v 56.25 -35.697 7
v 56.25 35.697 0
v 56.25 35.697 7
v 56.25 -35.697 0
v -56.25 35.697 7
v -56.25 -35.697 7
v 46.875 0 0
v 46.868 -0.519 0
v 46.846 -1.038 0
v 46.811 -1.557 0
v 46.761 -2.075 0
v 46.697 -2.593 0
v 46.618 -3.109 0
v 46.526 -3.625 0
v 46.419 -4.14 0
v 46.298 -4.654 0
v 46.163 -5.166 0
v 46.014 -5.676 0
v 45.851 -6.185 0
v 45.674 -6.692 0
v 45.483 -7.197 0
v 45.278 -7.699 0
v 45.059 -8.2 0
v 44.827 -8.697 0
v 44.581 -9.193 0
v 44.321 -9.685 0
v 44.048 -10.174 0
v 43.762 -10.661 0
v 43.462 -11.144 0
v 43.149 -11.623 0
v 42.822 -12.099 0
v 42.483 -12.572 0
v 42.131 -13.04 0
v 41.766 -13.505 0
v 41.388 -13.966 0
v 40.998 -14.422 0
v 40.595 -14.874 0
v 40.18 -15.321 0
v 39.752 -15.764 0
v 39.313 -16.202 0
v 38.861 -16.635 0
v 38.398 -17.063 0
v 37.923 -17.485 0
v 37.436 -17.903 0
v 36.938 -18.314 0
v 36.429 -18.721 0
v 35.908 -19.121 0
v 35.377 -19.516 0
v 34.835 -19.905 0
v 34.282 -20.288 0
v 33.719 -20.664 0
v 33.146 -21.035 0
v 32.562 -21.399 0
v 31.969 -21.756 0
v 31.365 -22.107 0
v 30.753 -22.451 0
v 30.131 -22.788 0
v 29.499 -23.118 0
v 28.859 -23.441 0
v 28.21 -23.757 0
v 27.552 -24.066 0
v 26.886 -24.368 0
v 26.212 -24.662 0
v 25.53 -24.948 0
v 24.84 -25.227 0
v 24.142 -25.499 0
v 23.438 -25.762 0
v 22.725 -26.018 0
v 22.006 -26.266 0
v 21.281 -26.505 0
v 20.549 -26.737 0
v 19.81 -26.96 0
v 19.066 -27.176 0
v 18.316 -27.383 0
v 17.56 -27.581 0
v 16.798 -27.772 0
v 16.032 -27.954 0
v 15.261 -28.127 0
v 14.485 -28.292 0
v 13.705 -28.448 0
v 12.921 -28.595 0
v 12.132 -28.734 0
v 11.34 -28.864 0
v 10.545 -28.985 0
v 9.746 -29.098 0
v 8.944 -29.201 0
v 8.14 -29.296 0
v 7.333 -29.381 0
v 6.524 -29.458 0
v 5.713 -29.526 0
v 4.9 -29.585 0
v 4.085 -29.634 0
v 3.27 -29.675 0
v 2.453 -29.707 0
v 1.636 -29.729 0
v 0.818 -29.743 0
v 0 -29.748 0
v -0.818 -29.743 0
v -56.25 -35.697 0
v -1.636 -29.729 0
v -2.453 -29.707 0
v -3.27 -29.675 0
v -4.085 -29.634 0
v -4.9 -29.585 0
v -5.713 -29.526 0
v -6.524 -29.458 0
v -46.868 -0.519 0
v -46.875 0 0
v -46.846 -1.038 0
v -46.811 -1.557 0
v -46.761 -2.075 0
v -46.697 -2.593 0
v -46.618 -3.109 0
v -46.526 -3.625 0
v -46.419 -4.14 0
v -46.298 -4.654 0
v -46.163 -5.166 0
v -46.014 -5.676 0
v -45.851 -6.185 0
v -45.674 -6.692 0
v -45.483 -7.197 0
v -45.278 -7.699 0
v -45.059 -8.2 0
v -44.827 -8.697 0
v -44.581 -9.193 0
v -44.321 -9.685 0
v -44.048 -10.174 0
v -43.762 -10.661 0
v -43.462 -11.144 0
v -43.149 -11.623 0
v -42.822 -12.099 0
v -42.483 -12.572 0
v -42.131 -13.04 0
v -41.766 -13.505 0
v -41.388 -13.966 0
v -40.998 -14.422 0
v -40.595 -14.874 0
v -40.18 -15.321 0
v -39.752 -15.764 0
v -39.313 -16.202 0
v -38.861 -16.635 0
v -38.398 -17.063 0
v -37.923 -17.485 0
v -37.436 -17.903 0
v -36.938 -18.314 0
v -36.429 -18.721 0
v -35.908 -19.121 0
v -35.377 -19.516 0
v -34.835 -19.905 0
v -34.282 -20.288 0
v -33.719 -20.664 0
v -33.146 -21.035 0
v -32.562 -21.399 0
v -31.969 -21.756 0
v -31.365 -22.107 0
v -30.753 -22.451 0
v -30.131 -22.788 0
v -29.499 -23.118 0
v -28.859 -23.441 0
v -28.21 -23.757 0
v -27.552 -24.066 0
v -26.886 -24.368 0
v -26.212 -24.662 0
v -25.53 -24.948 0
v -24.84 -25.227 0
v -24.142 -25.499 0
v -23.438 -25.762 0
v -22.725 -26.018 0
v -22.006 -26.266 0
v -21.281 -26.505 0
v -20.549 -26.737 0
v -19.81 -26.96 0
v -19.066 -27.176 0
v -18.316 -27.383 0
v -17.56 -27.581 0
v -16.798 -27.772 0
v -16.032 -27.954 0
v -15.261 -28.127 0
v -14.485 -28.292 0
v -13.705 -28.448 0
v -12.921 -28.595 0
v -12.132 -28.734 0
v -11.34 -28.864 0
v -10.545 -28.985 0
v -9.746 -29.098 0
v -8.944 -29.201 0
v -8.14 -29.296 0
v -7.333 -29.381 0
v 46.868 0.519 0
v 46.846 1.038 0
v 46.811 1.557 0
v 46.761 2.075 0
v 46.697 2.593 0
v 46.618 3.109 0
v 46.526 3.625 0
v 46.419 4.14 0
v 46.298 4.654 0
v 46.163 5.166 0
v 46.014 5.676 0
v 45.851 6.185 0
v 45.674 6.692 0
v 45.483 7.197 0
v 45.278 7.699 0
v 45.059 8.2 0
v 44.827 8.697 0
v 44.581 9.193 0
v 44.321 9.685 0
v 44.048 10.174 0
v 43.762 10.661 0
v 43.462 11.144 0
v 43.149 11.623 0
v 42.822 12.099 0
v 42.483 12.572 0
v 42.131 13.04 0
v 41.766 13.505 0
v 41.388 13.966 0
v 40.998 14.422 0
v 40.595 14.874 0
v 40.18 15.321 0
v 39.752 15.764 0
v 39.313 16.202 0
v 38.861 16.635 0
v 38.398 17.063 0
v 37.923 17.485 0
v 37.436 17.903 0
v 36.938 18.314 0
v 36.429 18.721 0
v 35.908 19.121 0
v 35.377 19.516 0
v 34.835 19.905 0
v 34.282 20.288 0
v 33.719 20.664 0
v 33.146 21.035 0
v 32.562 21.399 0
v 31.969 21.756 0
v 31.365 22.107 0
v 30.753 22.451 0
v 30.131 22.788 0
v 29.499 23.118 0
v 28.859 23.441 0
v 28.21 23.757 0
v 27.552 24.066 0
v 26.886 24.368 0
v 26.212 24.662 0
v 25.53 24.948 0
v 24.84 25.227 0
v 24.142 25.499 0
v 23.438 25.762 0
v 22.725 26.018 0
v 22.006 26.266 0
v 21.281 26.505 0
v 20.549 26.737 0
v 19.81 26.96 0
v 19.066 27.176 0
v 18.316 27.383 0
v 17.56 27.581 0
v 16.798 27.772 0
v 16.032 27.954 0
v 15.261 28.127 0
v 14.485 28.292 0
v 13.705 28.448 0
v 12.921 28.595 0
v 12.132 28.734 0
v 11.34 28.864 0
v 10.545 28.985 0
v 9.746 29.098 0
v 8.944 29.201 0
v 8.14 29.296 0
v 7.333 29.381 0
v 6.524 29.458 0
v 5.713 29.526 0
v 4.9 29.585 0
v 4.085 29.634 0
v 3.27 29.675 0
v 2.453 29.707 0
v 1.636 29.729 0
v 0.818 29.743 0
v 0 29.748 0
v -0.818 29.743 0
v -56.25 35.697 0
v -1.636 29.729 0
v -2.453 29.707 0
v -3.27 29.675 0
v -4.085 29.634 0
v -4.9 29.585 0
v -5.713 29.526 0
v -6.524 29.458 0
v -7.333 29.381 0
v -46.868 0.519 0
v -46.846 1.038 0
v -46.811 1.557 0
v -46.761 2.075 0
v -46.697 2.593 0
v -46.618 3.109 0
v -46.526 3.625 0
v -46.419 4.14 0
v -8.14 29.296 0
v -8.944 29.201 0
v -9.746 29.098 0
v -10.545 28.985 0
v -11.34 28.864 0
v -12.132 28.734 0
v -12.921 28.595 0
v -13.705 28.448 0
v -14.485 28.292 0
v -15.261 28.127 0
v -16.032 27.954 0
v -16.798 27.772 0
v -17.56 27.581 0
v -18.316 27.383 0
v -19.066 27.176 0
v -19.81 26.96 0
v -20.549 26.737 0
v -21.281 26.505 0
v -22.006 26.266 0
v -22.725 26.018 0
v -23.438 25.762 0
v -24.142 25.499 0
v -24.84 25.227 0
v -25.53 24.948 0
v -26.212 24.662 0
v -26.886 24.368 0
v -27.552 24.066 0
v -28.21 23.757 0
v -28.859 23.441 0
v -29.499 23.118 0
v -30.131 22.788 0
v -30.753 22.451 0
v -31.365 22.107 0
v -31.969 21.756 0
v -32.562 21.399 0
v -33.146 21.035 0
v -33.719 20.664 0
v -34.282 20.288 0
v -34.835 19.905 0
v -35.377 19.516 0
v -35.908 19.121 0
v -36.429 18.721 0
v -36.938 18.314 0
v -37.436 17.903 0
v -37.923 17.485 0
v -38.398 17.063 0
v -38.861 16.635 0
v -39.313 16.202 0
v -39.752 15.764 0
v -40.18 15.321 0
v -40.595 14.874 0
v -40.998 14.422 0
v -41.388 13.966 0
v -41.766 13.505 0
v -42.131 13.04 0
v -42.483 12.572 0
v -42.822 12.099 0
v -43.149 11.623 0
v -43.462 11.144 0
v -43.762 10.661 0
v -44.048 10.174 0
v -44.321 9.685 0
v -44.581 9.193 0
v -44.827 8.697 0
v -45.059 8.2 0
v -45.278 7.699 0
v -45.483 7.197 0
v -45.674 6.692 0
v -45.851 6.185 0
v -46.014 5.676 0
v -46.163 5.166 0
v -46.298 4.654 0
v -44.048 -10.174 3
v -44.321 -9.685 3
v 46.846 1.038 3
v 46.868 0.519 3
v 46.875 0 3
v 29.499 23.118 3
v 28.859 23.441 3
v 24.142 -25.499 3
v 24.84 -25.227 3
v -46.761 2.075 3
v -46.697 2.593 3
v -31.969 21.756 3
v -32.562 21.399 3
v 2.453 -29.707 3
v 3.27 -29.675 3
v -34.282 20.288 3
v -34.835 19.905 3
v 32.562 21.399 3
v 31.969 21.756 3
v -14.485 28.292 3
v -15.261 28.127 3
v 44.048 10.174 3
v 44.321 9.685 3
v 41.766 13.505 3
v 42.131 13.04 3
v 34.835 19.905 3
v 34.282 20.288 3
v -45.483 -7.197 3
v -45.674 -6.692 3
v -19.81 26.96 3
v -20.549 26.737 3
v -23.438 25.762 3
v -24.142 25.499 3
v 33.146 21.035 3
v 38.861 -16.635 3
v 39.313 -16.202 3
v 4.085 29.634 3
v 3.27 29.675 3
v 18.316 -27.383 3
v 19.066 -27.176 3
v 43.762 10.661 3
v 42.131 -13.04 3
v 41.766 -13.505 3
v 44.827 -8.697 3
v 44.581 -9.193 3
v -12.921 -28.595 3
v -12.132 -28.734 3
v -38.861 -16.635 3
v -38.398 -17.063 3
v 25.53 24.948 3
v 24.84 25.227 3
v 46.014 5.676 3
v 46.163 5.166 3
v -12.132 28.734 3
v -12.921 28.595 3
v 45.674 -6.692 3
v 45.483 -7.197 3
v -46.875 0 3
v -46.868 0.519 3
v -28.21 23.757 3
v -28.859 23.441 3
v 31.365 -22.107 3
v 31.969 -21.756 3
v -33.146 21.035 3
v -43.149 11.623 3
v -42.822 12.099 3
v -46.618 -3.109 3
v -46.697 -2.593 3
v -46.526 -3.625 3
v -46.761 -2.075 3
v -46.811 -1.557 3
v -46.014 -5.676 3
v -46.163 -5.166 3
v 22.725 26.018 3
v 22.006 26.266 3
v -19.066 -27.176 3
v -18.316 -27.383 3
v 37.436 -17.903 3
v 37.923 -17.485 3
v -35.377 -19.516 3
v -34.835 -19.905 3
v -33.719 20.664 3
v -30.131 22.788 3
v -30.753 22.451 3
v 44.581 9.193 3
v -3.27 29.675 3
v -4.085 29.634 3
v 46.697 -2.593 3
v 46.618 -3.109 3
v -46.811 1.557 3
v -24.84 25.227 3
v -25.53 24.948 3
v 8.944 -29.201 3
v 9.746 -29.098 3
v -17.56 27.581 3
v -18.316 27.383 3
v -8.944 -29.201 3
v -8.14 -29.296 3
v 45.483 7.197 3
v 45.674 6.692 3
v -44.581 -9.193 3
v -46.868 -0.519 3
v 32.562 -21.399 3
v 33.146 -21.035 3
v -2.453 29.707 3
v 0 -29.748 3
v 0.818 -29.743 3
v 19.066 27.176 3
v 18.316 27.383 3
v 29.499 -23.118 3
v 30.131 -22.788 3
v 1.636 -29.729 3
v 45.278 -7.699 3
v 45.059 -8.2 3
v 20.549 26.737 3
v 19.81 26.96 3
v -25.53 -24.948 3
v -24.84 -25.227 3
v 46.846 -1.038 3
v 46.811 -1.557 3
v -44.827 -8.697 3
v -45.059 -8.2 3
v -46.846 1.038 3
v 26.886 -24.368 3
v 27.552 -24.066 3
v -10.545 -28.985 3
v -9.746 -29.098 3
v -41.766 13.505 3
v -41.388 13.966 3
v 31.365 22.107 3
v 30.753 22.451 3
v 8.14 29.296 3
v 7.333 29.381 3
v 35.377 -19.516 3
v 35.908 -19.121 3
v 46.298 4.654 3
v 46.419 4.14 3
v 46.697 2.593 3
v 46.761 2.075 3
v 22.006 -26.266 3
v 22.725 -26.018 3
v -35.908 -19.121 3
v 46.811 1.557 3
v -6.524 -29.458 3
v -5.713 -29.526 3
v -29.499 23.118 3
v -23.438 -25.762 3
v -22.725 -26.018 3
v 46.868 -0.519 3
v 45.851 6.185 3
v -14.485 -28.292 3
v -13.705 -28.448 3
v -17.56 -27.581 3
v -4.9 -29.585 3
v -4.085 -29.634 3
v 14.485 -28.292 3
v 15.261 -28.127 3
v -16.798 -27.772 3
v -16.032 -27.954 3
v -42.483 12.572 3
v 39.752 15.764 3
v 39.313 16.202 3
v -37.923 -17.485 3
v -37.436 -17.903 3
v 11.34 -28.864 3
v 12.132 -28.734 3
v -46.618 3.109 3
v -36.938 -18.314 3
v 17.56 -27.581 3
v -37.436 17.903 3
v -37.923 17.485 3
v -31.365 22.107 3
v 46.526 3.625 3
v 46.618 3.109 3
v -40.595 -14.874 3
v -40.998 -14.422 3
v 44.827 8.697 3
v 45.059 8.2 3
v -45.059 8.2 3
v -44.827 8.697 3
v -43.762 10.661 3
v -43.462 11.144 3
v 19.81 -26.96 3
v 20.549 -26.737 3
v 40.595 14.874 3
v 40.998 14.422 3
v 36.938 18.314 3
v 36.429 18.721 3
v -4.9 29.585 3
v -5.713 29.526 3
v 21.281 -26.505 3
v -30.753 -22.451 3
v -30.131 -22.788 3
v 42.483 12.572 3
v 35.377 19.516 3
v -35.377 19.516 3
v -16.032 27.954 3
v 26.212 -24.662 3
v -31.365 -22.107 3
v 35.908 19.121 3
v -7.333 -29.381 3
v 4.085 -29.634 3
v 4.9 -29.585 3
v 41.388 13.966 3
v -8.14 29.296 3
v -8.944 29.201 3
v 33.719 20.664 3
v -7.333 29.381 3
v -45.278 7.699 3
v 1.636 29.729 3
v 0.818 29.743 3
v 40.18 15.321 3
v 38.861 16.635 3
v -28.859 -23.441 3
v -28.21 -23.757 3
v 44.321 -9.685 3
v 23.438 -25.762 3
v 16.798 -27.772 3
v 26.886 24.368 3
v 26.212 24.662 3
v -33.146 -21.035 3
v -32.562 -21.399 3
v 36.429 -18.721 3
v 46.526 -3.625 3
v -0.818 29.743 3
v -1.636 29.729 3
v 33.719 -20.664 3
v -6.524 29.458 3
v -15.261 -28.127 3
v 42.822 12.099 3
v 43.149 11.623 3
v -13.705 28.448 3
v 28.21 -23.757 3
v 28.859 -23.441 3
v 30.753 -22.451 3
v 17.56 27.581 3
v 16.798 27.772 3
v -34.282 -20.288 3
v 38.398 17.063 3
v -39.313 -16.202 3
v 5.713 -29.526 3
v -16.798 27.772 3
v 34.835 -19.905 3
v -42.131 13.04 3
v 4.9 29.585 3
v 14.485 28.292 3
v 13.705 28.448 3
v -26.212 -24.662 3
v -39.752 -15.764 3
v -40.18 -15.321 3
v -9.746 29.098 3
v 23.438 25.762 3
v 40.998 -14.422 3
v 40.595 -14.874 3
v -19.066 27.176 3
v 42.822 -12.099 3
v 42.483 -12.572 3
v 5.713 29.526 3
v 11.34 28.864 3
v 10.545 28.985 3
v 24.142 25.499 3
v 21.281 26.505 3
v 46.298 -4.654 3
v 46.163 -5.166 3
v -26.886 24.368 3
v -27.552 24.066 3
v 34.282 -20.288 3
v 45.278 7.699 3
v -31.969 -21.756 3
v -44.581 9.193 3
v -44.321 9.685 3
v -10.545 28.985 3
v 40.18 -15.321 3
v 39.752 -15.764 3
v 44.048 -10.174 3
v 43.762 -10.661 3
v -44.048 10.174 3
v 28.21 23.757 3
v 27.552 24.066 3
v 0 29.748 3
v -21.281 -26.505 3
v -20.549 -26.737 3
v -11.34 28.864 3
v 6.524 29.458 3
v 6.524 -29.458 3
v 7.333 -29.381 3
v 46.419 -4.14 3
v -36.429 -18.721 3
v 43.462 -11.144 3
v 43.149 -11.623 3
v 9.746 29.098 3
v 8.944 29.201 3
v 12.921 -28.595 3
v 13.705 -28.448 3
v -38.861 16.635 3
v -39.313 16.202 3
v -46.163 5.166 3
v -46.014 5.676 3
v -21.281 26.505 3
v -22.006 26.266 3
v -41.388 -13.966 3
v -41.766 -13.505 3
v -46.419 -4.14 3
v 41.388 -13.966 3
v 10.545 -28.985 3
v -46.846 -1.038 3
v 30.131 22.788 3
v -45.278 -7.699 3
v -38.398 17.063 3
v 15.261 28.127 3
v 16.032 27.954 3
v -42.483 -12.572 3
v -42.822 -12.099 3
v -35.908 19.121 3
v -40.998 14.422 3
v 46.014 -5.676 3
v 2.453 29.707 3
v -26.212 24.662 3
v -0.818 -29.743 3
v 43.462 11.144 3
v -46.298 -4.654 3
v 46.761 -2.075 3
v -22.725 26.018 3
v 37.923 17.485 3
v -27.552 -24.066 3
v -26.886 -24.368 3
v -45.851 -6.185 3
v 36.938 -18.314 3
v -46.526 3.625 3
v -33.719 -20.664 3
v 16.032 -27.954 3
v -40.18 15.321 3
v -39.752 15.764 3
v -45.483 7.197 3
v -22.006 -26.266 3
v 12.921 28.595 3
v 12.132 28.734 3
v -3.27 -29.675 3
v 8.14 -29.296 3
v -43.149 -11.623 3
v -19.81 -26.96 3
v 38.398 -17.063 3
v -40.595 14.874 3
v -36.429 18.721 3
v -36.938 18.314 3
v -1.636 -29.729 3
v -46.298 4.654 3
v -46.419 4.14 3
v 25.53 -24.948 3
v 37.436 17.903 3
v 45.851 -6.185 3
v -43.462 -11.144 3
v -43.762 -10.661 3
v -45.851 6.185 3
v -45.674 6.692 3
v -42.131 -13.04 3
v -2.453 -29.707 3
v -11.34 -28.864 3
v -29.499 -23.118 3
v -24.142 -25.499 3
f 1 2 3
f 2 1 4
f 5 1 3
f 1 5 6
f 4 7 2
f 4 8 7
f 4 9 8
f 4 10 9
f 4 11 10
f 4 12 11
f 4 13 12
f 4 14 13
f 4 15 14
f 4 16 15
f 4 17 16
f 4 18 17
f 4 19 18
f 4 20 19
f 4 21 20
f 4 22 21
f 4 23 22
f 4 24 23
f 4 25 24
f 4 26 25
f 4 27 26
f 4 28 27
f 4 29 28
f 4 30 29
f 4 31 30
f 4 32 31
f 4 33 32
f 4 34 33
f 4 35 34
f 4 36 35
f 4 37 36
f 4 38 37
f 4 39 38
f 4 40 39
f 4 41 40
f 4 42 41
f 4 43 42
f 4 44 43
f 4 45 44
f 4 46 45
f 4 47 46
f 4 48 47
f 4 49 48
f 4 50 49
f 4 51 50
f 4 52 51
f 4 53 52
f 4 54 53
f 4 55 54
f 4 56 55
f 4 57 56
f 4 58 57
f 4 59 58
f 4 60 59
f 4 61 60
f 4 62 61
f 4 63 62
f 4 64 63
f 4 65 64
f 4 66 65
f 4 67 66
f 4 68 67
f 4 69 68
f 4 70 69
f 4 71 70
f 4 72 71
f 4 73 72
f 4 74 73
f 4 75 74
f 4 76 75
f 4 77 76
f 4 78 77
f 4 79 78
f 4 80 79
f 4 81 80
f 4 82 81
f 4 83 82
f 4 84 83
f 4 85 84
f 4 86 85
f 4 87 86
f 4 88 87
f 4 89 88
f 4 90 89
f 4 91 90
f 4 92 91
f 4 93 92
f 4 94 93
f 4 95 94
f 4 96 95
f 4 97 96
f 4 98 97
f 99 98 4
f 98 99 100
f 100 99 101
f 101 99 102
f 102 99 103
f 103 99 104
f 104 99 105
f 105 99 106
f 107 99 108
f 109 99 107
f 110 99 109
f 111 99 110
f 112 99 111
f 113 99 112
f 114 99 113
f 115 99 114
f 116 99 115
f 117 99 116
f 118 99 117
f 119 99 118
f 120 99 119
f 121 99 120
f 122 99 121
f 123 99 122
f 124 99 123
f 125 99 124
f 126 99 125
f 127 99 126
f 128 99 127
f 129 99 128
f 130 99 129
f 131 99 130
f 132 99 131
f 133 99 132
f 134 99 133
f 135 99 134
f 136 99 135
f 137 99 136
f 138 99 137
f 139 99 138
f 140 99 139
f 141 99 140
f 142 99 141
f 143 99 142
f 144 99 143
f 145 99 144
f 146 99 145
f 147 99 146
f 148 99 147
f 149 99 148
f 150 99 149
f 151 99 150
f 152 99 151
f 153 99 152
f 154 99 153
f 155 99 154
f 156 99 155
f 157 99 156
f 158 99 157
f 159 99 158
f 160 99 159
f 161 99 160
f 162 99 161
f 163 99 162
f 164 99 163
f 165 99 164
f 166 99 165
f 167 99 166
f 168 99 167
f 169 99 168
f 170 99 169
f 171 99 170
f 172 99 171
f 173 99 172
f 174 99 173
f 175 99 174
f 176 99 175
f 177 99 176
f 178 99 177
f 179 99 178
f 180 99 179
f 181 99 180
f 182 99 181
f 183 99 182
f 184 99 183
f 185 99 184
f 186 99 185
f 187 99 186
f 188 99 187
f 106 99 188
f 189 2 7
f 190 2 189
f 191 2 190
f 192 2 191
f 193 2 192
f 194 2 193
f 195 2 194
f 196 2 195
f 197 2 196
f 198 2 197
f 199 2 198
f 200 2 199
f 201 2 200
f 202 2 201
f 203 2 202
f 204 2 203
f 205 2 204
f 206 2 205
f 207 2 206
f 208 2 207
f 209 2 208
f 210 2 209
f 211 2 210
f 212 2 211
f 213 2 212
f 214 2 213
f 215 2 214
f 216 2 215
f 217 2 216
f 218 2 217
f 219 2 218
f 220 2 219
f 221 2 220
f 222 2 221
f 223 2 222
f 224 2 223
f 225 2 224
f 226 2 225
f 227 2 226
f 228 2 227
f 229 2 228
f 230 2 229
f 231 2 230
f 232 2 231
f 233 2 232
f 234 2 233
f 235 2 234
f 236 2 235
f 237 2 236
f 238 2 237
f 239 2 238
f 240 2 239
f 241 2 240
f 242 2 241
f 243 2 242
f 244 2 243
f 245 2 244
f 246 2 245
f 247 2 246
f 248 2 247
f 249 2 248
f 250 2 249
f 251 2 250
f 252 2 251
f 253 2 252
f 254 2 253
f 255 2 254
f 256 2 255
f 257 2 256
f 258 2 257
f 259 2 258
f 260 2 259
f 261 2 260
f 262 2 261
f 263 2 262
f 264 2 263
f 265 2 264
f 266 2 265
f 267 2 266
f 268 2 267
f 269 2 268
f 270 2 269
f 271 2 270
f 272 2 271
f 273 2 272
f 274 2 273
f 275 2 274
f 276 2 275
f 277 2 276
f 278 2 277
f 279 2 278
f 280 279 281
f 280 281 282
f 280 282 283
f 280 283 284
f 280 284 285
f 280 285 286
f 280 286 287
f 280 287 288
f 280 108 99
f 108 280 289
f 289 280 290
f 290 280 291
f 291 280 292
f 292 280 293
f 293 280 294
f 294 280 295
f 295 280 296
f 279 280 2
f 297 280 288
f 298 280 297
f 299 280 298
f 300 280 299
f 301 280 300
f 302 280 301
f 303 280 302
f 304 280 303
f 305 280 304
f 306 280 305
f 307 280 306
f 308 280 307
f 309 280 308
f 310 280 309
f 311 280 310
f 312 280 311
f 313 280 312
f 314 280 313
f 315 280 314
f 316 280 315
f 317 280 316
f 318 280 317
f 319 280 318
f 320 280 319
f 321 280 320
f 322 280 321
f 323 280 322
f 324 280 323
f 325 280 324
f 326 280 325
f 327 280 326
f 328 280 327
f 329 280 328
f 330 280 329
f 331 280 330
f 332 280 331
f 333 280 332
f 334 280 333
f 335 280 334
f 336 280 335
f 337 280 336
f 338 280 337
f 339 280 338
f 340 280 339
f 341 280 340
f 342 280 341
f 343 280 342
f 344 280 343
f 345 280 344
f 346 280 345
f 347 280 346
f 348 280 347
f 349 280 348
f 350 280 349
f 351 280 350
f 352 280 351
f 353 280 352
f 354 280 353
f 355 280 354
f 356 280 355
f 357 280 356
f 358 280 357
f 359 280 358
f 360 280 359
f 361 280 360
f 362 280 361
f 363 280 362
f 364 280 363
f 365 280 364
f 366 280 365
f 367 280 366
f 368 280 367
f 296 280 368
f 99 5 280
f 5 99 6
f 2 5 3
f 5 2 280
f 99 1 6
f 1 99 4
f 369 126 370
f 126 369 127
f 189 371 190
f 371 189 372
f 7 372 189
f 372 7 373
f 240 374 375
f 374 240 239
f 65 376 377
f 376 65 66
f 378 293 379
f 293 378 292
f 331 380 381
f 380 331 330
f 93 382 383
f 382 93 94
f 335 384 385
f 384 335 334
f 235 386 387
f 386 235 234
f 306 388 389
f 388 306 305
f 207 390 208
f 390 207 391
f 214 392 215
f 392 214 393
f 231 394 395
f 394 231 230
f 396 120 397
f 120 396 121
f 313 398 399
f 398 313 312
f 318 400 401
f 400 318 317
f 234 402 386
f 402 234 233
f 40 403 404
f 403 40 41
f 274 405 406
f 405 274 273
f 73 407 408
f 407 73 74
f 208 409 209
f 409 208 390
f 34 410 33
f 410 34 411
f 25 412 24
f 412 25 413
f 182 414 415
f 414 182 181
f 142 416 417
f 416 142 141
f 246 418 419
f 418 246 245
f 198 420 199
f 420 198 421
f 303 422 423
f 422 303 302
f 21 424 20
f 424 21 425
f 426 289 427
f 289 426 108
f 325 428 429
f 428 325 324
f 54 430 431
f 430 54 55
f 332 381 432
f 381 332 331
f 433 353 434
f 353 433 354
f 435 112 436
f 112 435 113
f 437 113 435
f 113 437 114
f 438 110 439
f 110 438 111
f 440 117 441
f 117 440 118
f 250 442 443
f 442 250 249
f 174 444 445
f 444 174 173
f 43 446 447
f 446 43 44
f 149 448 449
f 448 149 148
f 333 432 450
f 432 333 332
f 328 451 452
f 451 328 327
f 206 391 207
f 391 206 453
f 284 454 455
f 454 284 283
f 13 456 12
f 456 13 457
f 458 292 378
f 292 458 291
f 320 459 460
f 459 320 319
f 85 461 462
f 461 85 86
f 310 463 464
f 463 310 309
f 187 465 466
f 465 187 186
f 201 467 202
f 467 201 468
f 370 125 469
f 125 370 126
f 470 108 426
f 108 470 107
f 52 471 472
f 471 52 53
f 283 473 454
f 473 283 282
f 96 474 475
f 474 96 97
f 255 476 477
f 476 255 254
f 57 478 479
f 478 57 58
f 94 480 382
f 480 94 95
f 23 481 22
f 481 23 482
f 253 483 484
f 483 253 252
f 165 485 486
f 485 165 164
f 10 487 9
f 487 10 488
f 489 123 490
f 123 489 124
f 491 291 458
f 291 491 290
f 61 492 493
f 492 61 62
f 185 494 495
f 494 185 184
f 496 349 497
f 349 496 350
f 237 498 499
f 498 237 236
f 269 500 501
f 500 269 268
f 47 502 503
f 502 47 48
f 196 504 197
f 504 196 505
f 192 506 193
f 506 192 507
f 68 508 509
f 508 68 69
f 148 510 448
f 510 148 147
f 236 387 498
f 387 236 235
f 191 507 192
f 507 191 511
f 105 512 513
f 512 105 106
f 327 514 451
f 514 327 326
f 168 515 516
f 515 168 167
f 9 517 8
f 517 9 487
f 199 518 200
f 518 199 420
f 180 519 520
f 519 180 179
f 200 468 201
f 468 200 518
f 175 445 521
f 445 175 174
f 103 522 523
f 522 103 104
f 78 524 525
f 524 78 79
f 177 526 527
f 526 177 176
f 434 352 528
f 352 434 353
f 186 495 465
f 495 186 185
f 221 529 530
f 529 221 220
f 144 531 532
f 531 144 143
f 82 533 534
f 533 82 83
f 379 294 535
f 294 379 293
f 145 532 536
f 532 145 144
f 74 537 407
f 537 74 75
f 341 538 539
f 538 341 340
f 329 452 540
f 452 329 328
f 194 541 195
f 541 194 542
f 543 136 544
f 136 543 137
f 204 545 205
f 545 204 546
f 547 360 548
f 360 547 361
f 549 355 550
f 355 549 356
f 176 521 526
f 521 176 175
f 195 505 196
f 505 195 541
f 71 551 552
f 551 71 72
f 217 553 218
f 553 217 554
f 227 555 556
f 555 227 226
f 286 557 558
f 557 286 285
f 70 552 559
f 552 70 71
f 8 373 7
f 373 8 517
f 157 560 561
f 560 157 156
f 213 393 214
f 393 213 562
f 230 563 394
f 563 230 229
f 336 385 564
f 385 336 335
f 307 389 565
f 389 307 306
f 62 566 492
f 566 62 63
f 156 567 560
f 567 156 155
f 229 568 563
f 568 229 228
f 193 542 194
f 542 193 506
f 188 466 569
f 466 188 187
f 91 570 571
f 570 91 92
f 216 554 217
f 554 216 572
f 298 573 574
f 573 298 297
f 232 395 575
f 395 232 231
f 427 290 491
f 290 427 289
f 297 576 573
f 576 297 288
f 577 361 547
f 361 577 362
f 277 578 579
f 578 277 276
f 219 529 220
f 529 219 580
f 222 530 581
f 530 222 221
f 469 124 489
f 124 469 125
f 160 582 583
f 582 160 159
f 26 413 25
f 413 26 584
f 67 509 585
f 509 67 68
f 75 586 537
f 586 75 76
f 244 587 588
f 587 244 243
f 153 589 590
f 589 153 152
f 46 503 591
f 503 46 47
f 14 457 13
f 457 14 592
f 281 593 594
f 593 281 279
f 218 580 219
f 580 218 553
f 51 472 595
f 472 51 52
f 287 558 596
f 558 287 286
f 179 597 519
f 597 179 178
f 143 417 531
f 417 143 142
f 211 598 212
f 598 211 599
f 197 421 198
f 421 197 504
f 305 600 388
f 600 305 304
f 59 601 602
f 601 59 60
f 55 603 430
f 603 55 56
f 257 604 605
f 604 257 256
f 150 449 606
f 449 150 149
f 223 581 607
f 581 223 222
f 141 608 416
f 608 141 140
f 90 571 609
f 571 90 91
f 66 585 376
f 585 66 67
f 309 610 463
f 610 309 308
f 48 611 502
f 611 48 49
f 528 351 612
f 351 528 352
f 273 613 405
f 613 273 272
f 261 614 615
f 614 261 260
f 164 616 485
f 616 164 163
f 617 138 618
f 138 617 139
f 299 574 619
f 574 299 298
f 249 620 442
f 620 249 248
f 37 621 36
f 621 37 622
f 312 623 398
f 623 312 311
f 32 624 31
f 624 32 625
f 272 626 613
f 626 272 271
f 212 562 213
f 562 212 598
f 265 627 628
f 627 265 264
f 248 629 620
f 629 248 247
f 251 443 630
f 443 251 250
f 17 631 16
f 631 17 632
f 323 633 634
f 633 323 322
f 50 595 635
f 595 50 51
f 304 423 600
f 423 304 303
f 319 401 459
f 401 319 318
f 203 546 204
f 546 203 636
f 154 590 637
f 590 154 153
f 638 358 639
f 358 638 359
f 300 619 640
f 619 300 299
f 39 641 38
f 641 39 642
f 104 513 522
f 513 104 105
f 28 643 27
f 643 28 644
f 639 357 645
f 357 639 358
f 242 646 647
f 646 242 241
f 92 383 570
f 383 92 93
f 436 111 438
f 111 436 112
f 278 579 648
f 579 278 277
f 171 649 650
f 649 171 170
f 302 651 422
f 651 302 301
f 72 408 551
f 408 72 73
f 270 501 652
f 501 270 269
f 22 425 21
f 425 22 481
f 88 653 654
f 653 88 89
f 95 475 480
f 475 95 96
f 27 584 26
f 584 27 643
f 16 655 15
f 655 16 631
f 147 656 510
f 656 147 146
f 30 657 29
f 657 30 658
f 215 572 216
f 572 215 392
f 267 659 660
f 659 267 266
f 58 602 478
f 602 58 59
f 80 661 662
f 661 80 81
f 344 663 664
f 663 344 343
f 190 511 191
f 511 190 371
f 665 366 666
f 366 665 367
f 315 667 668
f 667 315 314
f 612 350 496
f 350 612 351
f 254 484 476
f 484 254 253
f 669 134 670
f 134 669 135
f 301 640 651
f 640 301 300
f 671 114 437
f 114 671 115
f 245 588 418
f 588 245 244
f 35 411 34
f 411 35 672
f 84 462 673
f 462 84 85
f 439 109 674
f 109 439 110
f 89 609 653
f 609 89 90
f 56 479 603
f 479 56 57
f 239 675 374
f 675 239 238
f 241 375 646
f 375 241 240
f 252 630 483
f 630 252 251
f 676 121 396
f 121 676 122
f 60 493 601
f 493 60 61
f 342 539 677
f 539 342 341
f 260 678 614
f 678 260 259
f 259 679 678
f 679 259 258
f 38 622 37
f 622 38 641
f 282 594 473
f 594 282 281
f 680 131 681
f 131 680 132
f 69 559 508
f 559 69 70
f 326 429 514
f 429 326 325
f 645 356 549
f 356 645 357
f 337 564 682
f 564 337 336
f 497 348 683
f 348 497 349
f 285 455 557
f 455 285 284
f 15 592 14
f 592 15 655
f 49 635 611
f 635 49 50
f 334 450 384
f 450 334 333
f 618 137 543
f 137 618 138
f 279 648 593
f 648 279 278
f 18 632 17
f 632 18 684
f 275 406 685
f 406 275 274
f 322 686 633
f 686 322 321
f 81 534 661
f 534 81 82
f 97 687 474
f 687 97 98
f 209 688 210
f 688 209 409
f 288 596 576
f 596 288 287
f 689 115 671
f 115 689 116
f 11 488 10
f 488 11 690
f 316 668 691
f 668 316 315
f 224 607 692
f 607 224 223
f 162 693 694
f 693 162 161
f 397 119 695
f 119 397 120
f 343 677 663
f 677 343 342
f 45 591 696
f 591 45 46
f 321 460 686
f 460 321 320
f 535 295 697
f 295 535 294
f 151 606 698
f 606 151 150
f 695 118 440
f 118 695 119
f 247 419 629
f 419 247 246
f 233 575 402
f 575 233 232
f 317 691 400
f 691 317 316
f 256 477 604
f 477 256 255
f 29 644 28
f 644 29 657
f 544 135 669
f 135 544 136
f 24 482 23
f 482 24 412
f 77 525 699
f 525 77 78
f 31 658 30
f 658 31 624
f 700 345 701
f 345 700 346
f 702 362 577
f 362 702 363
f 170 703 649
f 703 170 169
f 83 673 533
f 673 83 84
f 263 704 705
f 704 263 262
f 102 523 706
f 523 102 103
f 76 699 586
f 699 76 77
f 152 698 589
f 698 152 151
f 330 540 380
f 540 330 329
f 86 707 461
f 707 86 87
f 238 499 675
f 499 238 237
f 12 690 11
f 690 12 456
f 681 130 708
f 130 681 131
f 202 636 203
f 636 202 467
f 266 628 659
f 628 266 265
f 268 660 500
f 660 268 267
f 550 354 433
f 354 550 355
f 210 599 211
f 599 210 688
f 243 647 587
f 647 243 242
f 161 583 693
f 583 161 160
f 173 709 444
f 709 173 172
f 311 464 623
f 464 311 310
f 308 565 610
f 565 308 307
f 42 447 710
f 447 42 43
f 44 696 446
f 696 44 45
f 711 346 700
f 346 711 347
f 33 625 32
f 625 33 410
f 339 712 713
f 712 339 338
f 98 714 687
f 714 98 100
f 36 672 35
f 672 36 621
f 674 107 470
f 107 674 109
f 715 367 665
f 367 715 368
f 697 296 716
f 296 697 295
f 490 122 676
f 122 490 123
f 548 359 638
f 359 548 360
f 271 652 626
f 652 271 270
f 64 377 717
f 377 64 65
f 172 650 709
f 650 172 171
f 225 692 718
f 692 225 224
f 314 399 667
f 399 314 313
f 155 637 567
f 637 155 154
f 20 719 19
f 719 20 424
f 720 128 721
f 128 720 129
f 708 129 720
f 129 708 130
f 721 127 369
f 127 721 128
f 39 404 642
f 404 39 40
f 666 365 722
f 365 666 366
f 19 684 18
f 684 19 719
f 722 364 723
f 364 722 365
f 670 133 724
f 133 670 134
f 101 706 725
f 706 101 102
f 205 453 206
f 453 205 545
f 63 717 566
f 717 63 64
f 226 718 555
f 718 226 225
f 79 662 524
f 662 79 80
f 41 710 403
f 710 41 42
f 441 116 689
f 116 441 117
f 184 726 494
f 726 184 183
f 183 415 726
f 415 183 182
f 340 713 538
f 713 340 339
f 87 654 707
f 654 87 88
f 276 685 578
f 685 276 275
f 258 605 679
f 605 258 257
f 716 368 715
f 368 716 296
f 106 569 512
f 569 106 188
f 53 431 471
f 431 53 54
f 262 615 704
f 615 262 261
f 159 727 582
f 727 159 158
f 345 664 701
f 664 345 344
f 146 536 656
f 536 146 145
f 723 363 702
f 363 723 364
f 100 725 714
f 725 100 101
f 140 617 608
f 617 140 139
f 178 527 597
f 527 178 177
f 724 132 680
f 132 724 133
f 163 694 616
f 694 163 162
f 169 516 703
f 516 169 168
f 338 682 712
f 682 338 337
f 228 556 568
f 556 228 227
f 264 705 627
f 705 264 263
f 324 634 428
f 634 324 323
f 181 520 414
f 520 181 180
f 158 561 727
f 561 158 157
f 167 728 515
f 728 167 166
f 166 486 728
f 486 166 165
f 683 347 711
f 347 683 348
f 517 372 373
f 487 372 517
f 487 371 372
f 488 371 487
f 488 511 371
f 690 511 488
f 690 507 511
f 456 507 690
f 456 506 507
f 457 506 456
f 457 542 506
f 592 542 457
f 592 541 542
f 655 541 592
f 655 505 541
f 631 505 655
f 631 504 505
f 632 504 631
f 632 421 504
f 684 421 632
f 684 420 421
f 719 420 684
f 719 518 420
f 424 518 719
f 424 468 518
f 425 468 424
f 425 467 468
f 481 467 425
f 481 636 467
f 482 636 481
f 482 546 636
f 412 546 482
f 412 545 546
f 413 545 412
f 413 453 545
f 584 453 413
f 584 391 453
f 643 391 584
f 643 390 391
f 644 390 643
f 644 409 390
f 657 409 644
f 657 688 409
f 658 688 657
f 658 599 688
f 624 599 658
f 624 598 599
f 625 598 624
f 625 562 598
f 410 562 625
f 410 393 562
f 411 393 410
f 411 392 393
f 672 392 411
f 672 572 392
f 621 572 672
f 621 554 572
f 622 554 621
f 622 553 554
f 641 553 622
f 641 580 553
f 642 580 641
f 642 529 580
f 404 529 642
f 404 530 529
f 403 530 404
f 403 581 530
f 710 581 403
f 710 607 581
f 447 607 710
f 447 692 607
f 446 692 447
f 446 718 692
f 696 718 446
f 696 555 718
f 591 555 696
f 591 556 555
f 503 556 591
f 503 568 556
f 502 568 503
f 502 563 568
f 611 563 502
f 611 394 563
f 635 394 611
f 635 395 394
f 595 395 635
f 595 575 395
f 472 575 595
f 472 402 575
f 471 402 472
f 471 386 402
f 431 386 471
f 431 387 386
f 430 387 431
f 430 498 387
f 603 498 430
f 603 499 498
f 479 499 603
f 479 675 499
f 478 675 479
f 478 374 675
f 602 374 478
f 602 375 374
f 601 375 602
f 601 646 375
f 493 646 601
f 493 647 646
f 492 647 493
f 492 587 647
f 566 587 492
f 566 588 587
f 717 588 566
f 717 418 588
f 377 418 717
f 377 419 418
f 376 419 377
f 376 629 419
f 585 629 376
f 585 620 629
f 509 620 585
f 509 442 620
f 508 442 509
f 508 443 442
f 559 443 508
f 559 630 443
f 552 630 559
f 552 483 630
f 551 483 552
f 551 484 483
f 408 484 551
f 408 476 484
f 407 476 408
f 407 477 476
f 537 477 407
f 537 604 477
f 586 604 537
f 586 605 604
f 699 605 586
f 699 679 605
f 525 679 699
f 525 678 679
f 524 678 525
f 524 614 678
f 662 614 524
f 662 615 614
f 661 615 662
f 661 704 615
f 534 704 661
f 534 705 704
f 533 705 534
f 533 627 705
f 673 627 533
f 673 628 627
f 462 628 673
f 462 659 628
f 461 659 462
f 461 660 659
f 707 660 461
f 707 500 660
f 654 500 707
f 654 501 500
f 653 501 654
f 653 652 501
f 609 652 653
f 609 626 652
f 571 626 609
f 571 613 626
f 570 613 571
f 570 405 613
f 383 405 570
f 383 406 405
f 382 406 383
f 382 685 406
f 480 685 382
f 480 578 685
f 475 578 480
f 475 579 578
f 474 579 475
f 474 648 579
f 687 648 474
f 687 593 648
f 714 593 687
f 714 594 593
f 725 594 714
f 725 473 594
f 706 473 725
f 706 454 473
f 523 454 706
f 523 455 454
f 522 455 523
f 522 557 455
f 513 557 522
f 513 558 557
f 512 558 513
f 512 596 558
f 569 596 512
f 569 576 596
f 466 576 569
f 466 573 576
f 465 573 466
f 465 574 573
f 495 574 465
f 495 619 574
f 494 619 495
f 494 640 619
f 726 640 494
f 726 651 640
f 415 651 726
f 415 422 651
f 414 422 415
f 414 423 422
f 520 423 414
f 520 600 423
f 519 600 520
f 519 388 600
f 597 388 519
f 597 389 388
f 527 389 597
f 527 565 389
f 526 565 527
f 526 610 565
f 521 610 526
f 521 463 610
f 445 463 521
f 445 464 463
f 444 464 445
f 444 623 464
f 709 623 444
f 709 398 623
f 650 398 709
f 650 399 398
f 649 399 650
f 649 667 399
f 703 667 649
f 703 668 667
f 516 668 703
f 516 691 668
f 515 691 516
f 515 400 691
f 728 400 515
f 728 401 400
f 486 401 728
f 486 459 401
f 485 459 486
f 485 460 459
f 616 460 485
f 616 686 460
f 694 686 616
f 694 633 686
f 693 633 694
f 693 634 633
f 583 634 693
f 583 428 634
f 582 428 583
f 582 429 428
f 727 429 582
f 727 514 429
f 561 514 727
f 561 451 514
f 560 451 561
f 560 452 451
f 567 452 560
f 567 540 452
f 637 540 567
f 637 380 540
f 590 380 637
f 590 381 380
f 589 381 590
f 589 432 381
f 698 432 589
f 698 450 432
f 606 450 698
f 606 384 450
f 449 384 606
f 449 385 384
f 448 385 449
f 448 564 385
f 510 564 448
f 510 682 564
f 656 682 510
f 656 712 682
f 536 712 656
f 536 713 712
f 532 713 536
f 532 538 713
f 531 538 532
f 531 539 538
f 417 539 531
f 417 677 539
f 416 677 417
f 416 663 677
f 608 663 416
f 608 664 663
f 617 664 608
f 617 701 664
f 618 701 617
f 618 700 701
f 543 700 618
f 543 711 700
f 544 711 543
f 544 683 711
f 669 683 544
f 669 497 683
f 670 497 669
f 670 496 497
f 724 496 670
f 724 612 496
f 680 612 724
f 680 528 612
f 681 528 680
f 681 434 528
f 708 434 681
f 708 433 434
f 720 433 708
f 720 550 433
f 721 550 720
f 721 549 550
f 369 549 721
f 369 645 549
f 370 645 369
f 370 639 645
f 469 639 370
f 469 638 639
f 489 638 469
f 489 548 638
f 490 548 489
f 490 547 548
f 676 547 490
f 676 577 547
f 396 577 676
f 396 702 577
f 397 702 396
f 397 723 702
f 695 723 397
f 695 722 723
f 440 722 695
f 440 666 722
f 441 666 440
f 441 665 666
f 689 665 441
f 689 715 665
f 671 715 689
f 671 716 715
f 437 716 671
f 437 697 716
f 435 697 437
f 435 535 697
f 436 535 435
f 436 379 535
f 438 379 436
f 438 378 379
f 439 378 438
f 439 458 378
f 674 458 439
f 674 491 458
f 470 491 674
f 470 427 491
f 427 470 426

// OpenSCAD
$fn=360;

$length=100;
$width=30;
$height=30;
$radius=5;

$logo_width=150;
$logo_height=$logo_width*33/52;

$length_scale=($logo_height+$width/4)/$length;

module logo(){
    scale([$logo_width*1.25,$logo_height*1.25]) cylinder(d=1,h=3);
    
    translate([-$logo_width/2,-$logo_height/2]){
        linear_extrude(height=6){
                scale($logo_width/52){
                import("/home/bryce/Downloads/8_TH_SOLID_0004_black.dxf");
            }
        }
    }
}

scale([0.5,0.5]){
    difference(){
        translate([-$logo_width*.75,-$logo_height*.75,0]){
            cube([$logo_width*1.5,$logo_height*1.5,7]);
        }
        logo();
    }
}
